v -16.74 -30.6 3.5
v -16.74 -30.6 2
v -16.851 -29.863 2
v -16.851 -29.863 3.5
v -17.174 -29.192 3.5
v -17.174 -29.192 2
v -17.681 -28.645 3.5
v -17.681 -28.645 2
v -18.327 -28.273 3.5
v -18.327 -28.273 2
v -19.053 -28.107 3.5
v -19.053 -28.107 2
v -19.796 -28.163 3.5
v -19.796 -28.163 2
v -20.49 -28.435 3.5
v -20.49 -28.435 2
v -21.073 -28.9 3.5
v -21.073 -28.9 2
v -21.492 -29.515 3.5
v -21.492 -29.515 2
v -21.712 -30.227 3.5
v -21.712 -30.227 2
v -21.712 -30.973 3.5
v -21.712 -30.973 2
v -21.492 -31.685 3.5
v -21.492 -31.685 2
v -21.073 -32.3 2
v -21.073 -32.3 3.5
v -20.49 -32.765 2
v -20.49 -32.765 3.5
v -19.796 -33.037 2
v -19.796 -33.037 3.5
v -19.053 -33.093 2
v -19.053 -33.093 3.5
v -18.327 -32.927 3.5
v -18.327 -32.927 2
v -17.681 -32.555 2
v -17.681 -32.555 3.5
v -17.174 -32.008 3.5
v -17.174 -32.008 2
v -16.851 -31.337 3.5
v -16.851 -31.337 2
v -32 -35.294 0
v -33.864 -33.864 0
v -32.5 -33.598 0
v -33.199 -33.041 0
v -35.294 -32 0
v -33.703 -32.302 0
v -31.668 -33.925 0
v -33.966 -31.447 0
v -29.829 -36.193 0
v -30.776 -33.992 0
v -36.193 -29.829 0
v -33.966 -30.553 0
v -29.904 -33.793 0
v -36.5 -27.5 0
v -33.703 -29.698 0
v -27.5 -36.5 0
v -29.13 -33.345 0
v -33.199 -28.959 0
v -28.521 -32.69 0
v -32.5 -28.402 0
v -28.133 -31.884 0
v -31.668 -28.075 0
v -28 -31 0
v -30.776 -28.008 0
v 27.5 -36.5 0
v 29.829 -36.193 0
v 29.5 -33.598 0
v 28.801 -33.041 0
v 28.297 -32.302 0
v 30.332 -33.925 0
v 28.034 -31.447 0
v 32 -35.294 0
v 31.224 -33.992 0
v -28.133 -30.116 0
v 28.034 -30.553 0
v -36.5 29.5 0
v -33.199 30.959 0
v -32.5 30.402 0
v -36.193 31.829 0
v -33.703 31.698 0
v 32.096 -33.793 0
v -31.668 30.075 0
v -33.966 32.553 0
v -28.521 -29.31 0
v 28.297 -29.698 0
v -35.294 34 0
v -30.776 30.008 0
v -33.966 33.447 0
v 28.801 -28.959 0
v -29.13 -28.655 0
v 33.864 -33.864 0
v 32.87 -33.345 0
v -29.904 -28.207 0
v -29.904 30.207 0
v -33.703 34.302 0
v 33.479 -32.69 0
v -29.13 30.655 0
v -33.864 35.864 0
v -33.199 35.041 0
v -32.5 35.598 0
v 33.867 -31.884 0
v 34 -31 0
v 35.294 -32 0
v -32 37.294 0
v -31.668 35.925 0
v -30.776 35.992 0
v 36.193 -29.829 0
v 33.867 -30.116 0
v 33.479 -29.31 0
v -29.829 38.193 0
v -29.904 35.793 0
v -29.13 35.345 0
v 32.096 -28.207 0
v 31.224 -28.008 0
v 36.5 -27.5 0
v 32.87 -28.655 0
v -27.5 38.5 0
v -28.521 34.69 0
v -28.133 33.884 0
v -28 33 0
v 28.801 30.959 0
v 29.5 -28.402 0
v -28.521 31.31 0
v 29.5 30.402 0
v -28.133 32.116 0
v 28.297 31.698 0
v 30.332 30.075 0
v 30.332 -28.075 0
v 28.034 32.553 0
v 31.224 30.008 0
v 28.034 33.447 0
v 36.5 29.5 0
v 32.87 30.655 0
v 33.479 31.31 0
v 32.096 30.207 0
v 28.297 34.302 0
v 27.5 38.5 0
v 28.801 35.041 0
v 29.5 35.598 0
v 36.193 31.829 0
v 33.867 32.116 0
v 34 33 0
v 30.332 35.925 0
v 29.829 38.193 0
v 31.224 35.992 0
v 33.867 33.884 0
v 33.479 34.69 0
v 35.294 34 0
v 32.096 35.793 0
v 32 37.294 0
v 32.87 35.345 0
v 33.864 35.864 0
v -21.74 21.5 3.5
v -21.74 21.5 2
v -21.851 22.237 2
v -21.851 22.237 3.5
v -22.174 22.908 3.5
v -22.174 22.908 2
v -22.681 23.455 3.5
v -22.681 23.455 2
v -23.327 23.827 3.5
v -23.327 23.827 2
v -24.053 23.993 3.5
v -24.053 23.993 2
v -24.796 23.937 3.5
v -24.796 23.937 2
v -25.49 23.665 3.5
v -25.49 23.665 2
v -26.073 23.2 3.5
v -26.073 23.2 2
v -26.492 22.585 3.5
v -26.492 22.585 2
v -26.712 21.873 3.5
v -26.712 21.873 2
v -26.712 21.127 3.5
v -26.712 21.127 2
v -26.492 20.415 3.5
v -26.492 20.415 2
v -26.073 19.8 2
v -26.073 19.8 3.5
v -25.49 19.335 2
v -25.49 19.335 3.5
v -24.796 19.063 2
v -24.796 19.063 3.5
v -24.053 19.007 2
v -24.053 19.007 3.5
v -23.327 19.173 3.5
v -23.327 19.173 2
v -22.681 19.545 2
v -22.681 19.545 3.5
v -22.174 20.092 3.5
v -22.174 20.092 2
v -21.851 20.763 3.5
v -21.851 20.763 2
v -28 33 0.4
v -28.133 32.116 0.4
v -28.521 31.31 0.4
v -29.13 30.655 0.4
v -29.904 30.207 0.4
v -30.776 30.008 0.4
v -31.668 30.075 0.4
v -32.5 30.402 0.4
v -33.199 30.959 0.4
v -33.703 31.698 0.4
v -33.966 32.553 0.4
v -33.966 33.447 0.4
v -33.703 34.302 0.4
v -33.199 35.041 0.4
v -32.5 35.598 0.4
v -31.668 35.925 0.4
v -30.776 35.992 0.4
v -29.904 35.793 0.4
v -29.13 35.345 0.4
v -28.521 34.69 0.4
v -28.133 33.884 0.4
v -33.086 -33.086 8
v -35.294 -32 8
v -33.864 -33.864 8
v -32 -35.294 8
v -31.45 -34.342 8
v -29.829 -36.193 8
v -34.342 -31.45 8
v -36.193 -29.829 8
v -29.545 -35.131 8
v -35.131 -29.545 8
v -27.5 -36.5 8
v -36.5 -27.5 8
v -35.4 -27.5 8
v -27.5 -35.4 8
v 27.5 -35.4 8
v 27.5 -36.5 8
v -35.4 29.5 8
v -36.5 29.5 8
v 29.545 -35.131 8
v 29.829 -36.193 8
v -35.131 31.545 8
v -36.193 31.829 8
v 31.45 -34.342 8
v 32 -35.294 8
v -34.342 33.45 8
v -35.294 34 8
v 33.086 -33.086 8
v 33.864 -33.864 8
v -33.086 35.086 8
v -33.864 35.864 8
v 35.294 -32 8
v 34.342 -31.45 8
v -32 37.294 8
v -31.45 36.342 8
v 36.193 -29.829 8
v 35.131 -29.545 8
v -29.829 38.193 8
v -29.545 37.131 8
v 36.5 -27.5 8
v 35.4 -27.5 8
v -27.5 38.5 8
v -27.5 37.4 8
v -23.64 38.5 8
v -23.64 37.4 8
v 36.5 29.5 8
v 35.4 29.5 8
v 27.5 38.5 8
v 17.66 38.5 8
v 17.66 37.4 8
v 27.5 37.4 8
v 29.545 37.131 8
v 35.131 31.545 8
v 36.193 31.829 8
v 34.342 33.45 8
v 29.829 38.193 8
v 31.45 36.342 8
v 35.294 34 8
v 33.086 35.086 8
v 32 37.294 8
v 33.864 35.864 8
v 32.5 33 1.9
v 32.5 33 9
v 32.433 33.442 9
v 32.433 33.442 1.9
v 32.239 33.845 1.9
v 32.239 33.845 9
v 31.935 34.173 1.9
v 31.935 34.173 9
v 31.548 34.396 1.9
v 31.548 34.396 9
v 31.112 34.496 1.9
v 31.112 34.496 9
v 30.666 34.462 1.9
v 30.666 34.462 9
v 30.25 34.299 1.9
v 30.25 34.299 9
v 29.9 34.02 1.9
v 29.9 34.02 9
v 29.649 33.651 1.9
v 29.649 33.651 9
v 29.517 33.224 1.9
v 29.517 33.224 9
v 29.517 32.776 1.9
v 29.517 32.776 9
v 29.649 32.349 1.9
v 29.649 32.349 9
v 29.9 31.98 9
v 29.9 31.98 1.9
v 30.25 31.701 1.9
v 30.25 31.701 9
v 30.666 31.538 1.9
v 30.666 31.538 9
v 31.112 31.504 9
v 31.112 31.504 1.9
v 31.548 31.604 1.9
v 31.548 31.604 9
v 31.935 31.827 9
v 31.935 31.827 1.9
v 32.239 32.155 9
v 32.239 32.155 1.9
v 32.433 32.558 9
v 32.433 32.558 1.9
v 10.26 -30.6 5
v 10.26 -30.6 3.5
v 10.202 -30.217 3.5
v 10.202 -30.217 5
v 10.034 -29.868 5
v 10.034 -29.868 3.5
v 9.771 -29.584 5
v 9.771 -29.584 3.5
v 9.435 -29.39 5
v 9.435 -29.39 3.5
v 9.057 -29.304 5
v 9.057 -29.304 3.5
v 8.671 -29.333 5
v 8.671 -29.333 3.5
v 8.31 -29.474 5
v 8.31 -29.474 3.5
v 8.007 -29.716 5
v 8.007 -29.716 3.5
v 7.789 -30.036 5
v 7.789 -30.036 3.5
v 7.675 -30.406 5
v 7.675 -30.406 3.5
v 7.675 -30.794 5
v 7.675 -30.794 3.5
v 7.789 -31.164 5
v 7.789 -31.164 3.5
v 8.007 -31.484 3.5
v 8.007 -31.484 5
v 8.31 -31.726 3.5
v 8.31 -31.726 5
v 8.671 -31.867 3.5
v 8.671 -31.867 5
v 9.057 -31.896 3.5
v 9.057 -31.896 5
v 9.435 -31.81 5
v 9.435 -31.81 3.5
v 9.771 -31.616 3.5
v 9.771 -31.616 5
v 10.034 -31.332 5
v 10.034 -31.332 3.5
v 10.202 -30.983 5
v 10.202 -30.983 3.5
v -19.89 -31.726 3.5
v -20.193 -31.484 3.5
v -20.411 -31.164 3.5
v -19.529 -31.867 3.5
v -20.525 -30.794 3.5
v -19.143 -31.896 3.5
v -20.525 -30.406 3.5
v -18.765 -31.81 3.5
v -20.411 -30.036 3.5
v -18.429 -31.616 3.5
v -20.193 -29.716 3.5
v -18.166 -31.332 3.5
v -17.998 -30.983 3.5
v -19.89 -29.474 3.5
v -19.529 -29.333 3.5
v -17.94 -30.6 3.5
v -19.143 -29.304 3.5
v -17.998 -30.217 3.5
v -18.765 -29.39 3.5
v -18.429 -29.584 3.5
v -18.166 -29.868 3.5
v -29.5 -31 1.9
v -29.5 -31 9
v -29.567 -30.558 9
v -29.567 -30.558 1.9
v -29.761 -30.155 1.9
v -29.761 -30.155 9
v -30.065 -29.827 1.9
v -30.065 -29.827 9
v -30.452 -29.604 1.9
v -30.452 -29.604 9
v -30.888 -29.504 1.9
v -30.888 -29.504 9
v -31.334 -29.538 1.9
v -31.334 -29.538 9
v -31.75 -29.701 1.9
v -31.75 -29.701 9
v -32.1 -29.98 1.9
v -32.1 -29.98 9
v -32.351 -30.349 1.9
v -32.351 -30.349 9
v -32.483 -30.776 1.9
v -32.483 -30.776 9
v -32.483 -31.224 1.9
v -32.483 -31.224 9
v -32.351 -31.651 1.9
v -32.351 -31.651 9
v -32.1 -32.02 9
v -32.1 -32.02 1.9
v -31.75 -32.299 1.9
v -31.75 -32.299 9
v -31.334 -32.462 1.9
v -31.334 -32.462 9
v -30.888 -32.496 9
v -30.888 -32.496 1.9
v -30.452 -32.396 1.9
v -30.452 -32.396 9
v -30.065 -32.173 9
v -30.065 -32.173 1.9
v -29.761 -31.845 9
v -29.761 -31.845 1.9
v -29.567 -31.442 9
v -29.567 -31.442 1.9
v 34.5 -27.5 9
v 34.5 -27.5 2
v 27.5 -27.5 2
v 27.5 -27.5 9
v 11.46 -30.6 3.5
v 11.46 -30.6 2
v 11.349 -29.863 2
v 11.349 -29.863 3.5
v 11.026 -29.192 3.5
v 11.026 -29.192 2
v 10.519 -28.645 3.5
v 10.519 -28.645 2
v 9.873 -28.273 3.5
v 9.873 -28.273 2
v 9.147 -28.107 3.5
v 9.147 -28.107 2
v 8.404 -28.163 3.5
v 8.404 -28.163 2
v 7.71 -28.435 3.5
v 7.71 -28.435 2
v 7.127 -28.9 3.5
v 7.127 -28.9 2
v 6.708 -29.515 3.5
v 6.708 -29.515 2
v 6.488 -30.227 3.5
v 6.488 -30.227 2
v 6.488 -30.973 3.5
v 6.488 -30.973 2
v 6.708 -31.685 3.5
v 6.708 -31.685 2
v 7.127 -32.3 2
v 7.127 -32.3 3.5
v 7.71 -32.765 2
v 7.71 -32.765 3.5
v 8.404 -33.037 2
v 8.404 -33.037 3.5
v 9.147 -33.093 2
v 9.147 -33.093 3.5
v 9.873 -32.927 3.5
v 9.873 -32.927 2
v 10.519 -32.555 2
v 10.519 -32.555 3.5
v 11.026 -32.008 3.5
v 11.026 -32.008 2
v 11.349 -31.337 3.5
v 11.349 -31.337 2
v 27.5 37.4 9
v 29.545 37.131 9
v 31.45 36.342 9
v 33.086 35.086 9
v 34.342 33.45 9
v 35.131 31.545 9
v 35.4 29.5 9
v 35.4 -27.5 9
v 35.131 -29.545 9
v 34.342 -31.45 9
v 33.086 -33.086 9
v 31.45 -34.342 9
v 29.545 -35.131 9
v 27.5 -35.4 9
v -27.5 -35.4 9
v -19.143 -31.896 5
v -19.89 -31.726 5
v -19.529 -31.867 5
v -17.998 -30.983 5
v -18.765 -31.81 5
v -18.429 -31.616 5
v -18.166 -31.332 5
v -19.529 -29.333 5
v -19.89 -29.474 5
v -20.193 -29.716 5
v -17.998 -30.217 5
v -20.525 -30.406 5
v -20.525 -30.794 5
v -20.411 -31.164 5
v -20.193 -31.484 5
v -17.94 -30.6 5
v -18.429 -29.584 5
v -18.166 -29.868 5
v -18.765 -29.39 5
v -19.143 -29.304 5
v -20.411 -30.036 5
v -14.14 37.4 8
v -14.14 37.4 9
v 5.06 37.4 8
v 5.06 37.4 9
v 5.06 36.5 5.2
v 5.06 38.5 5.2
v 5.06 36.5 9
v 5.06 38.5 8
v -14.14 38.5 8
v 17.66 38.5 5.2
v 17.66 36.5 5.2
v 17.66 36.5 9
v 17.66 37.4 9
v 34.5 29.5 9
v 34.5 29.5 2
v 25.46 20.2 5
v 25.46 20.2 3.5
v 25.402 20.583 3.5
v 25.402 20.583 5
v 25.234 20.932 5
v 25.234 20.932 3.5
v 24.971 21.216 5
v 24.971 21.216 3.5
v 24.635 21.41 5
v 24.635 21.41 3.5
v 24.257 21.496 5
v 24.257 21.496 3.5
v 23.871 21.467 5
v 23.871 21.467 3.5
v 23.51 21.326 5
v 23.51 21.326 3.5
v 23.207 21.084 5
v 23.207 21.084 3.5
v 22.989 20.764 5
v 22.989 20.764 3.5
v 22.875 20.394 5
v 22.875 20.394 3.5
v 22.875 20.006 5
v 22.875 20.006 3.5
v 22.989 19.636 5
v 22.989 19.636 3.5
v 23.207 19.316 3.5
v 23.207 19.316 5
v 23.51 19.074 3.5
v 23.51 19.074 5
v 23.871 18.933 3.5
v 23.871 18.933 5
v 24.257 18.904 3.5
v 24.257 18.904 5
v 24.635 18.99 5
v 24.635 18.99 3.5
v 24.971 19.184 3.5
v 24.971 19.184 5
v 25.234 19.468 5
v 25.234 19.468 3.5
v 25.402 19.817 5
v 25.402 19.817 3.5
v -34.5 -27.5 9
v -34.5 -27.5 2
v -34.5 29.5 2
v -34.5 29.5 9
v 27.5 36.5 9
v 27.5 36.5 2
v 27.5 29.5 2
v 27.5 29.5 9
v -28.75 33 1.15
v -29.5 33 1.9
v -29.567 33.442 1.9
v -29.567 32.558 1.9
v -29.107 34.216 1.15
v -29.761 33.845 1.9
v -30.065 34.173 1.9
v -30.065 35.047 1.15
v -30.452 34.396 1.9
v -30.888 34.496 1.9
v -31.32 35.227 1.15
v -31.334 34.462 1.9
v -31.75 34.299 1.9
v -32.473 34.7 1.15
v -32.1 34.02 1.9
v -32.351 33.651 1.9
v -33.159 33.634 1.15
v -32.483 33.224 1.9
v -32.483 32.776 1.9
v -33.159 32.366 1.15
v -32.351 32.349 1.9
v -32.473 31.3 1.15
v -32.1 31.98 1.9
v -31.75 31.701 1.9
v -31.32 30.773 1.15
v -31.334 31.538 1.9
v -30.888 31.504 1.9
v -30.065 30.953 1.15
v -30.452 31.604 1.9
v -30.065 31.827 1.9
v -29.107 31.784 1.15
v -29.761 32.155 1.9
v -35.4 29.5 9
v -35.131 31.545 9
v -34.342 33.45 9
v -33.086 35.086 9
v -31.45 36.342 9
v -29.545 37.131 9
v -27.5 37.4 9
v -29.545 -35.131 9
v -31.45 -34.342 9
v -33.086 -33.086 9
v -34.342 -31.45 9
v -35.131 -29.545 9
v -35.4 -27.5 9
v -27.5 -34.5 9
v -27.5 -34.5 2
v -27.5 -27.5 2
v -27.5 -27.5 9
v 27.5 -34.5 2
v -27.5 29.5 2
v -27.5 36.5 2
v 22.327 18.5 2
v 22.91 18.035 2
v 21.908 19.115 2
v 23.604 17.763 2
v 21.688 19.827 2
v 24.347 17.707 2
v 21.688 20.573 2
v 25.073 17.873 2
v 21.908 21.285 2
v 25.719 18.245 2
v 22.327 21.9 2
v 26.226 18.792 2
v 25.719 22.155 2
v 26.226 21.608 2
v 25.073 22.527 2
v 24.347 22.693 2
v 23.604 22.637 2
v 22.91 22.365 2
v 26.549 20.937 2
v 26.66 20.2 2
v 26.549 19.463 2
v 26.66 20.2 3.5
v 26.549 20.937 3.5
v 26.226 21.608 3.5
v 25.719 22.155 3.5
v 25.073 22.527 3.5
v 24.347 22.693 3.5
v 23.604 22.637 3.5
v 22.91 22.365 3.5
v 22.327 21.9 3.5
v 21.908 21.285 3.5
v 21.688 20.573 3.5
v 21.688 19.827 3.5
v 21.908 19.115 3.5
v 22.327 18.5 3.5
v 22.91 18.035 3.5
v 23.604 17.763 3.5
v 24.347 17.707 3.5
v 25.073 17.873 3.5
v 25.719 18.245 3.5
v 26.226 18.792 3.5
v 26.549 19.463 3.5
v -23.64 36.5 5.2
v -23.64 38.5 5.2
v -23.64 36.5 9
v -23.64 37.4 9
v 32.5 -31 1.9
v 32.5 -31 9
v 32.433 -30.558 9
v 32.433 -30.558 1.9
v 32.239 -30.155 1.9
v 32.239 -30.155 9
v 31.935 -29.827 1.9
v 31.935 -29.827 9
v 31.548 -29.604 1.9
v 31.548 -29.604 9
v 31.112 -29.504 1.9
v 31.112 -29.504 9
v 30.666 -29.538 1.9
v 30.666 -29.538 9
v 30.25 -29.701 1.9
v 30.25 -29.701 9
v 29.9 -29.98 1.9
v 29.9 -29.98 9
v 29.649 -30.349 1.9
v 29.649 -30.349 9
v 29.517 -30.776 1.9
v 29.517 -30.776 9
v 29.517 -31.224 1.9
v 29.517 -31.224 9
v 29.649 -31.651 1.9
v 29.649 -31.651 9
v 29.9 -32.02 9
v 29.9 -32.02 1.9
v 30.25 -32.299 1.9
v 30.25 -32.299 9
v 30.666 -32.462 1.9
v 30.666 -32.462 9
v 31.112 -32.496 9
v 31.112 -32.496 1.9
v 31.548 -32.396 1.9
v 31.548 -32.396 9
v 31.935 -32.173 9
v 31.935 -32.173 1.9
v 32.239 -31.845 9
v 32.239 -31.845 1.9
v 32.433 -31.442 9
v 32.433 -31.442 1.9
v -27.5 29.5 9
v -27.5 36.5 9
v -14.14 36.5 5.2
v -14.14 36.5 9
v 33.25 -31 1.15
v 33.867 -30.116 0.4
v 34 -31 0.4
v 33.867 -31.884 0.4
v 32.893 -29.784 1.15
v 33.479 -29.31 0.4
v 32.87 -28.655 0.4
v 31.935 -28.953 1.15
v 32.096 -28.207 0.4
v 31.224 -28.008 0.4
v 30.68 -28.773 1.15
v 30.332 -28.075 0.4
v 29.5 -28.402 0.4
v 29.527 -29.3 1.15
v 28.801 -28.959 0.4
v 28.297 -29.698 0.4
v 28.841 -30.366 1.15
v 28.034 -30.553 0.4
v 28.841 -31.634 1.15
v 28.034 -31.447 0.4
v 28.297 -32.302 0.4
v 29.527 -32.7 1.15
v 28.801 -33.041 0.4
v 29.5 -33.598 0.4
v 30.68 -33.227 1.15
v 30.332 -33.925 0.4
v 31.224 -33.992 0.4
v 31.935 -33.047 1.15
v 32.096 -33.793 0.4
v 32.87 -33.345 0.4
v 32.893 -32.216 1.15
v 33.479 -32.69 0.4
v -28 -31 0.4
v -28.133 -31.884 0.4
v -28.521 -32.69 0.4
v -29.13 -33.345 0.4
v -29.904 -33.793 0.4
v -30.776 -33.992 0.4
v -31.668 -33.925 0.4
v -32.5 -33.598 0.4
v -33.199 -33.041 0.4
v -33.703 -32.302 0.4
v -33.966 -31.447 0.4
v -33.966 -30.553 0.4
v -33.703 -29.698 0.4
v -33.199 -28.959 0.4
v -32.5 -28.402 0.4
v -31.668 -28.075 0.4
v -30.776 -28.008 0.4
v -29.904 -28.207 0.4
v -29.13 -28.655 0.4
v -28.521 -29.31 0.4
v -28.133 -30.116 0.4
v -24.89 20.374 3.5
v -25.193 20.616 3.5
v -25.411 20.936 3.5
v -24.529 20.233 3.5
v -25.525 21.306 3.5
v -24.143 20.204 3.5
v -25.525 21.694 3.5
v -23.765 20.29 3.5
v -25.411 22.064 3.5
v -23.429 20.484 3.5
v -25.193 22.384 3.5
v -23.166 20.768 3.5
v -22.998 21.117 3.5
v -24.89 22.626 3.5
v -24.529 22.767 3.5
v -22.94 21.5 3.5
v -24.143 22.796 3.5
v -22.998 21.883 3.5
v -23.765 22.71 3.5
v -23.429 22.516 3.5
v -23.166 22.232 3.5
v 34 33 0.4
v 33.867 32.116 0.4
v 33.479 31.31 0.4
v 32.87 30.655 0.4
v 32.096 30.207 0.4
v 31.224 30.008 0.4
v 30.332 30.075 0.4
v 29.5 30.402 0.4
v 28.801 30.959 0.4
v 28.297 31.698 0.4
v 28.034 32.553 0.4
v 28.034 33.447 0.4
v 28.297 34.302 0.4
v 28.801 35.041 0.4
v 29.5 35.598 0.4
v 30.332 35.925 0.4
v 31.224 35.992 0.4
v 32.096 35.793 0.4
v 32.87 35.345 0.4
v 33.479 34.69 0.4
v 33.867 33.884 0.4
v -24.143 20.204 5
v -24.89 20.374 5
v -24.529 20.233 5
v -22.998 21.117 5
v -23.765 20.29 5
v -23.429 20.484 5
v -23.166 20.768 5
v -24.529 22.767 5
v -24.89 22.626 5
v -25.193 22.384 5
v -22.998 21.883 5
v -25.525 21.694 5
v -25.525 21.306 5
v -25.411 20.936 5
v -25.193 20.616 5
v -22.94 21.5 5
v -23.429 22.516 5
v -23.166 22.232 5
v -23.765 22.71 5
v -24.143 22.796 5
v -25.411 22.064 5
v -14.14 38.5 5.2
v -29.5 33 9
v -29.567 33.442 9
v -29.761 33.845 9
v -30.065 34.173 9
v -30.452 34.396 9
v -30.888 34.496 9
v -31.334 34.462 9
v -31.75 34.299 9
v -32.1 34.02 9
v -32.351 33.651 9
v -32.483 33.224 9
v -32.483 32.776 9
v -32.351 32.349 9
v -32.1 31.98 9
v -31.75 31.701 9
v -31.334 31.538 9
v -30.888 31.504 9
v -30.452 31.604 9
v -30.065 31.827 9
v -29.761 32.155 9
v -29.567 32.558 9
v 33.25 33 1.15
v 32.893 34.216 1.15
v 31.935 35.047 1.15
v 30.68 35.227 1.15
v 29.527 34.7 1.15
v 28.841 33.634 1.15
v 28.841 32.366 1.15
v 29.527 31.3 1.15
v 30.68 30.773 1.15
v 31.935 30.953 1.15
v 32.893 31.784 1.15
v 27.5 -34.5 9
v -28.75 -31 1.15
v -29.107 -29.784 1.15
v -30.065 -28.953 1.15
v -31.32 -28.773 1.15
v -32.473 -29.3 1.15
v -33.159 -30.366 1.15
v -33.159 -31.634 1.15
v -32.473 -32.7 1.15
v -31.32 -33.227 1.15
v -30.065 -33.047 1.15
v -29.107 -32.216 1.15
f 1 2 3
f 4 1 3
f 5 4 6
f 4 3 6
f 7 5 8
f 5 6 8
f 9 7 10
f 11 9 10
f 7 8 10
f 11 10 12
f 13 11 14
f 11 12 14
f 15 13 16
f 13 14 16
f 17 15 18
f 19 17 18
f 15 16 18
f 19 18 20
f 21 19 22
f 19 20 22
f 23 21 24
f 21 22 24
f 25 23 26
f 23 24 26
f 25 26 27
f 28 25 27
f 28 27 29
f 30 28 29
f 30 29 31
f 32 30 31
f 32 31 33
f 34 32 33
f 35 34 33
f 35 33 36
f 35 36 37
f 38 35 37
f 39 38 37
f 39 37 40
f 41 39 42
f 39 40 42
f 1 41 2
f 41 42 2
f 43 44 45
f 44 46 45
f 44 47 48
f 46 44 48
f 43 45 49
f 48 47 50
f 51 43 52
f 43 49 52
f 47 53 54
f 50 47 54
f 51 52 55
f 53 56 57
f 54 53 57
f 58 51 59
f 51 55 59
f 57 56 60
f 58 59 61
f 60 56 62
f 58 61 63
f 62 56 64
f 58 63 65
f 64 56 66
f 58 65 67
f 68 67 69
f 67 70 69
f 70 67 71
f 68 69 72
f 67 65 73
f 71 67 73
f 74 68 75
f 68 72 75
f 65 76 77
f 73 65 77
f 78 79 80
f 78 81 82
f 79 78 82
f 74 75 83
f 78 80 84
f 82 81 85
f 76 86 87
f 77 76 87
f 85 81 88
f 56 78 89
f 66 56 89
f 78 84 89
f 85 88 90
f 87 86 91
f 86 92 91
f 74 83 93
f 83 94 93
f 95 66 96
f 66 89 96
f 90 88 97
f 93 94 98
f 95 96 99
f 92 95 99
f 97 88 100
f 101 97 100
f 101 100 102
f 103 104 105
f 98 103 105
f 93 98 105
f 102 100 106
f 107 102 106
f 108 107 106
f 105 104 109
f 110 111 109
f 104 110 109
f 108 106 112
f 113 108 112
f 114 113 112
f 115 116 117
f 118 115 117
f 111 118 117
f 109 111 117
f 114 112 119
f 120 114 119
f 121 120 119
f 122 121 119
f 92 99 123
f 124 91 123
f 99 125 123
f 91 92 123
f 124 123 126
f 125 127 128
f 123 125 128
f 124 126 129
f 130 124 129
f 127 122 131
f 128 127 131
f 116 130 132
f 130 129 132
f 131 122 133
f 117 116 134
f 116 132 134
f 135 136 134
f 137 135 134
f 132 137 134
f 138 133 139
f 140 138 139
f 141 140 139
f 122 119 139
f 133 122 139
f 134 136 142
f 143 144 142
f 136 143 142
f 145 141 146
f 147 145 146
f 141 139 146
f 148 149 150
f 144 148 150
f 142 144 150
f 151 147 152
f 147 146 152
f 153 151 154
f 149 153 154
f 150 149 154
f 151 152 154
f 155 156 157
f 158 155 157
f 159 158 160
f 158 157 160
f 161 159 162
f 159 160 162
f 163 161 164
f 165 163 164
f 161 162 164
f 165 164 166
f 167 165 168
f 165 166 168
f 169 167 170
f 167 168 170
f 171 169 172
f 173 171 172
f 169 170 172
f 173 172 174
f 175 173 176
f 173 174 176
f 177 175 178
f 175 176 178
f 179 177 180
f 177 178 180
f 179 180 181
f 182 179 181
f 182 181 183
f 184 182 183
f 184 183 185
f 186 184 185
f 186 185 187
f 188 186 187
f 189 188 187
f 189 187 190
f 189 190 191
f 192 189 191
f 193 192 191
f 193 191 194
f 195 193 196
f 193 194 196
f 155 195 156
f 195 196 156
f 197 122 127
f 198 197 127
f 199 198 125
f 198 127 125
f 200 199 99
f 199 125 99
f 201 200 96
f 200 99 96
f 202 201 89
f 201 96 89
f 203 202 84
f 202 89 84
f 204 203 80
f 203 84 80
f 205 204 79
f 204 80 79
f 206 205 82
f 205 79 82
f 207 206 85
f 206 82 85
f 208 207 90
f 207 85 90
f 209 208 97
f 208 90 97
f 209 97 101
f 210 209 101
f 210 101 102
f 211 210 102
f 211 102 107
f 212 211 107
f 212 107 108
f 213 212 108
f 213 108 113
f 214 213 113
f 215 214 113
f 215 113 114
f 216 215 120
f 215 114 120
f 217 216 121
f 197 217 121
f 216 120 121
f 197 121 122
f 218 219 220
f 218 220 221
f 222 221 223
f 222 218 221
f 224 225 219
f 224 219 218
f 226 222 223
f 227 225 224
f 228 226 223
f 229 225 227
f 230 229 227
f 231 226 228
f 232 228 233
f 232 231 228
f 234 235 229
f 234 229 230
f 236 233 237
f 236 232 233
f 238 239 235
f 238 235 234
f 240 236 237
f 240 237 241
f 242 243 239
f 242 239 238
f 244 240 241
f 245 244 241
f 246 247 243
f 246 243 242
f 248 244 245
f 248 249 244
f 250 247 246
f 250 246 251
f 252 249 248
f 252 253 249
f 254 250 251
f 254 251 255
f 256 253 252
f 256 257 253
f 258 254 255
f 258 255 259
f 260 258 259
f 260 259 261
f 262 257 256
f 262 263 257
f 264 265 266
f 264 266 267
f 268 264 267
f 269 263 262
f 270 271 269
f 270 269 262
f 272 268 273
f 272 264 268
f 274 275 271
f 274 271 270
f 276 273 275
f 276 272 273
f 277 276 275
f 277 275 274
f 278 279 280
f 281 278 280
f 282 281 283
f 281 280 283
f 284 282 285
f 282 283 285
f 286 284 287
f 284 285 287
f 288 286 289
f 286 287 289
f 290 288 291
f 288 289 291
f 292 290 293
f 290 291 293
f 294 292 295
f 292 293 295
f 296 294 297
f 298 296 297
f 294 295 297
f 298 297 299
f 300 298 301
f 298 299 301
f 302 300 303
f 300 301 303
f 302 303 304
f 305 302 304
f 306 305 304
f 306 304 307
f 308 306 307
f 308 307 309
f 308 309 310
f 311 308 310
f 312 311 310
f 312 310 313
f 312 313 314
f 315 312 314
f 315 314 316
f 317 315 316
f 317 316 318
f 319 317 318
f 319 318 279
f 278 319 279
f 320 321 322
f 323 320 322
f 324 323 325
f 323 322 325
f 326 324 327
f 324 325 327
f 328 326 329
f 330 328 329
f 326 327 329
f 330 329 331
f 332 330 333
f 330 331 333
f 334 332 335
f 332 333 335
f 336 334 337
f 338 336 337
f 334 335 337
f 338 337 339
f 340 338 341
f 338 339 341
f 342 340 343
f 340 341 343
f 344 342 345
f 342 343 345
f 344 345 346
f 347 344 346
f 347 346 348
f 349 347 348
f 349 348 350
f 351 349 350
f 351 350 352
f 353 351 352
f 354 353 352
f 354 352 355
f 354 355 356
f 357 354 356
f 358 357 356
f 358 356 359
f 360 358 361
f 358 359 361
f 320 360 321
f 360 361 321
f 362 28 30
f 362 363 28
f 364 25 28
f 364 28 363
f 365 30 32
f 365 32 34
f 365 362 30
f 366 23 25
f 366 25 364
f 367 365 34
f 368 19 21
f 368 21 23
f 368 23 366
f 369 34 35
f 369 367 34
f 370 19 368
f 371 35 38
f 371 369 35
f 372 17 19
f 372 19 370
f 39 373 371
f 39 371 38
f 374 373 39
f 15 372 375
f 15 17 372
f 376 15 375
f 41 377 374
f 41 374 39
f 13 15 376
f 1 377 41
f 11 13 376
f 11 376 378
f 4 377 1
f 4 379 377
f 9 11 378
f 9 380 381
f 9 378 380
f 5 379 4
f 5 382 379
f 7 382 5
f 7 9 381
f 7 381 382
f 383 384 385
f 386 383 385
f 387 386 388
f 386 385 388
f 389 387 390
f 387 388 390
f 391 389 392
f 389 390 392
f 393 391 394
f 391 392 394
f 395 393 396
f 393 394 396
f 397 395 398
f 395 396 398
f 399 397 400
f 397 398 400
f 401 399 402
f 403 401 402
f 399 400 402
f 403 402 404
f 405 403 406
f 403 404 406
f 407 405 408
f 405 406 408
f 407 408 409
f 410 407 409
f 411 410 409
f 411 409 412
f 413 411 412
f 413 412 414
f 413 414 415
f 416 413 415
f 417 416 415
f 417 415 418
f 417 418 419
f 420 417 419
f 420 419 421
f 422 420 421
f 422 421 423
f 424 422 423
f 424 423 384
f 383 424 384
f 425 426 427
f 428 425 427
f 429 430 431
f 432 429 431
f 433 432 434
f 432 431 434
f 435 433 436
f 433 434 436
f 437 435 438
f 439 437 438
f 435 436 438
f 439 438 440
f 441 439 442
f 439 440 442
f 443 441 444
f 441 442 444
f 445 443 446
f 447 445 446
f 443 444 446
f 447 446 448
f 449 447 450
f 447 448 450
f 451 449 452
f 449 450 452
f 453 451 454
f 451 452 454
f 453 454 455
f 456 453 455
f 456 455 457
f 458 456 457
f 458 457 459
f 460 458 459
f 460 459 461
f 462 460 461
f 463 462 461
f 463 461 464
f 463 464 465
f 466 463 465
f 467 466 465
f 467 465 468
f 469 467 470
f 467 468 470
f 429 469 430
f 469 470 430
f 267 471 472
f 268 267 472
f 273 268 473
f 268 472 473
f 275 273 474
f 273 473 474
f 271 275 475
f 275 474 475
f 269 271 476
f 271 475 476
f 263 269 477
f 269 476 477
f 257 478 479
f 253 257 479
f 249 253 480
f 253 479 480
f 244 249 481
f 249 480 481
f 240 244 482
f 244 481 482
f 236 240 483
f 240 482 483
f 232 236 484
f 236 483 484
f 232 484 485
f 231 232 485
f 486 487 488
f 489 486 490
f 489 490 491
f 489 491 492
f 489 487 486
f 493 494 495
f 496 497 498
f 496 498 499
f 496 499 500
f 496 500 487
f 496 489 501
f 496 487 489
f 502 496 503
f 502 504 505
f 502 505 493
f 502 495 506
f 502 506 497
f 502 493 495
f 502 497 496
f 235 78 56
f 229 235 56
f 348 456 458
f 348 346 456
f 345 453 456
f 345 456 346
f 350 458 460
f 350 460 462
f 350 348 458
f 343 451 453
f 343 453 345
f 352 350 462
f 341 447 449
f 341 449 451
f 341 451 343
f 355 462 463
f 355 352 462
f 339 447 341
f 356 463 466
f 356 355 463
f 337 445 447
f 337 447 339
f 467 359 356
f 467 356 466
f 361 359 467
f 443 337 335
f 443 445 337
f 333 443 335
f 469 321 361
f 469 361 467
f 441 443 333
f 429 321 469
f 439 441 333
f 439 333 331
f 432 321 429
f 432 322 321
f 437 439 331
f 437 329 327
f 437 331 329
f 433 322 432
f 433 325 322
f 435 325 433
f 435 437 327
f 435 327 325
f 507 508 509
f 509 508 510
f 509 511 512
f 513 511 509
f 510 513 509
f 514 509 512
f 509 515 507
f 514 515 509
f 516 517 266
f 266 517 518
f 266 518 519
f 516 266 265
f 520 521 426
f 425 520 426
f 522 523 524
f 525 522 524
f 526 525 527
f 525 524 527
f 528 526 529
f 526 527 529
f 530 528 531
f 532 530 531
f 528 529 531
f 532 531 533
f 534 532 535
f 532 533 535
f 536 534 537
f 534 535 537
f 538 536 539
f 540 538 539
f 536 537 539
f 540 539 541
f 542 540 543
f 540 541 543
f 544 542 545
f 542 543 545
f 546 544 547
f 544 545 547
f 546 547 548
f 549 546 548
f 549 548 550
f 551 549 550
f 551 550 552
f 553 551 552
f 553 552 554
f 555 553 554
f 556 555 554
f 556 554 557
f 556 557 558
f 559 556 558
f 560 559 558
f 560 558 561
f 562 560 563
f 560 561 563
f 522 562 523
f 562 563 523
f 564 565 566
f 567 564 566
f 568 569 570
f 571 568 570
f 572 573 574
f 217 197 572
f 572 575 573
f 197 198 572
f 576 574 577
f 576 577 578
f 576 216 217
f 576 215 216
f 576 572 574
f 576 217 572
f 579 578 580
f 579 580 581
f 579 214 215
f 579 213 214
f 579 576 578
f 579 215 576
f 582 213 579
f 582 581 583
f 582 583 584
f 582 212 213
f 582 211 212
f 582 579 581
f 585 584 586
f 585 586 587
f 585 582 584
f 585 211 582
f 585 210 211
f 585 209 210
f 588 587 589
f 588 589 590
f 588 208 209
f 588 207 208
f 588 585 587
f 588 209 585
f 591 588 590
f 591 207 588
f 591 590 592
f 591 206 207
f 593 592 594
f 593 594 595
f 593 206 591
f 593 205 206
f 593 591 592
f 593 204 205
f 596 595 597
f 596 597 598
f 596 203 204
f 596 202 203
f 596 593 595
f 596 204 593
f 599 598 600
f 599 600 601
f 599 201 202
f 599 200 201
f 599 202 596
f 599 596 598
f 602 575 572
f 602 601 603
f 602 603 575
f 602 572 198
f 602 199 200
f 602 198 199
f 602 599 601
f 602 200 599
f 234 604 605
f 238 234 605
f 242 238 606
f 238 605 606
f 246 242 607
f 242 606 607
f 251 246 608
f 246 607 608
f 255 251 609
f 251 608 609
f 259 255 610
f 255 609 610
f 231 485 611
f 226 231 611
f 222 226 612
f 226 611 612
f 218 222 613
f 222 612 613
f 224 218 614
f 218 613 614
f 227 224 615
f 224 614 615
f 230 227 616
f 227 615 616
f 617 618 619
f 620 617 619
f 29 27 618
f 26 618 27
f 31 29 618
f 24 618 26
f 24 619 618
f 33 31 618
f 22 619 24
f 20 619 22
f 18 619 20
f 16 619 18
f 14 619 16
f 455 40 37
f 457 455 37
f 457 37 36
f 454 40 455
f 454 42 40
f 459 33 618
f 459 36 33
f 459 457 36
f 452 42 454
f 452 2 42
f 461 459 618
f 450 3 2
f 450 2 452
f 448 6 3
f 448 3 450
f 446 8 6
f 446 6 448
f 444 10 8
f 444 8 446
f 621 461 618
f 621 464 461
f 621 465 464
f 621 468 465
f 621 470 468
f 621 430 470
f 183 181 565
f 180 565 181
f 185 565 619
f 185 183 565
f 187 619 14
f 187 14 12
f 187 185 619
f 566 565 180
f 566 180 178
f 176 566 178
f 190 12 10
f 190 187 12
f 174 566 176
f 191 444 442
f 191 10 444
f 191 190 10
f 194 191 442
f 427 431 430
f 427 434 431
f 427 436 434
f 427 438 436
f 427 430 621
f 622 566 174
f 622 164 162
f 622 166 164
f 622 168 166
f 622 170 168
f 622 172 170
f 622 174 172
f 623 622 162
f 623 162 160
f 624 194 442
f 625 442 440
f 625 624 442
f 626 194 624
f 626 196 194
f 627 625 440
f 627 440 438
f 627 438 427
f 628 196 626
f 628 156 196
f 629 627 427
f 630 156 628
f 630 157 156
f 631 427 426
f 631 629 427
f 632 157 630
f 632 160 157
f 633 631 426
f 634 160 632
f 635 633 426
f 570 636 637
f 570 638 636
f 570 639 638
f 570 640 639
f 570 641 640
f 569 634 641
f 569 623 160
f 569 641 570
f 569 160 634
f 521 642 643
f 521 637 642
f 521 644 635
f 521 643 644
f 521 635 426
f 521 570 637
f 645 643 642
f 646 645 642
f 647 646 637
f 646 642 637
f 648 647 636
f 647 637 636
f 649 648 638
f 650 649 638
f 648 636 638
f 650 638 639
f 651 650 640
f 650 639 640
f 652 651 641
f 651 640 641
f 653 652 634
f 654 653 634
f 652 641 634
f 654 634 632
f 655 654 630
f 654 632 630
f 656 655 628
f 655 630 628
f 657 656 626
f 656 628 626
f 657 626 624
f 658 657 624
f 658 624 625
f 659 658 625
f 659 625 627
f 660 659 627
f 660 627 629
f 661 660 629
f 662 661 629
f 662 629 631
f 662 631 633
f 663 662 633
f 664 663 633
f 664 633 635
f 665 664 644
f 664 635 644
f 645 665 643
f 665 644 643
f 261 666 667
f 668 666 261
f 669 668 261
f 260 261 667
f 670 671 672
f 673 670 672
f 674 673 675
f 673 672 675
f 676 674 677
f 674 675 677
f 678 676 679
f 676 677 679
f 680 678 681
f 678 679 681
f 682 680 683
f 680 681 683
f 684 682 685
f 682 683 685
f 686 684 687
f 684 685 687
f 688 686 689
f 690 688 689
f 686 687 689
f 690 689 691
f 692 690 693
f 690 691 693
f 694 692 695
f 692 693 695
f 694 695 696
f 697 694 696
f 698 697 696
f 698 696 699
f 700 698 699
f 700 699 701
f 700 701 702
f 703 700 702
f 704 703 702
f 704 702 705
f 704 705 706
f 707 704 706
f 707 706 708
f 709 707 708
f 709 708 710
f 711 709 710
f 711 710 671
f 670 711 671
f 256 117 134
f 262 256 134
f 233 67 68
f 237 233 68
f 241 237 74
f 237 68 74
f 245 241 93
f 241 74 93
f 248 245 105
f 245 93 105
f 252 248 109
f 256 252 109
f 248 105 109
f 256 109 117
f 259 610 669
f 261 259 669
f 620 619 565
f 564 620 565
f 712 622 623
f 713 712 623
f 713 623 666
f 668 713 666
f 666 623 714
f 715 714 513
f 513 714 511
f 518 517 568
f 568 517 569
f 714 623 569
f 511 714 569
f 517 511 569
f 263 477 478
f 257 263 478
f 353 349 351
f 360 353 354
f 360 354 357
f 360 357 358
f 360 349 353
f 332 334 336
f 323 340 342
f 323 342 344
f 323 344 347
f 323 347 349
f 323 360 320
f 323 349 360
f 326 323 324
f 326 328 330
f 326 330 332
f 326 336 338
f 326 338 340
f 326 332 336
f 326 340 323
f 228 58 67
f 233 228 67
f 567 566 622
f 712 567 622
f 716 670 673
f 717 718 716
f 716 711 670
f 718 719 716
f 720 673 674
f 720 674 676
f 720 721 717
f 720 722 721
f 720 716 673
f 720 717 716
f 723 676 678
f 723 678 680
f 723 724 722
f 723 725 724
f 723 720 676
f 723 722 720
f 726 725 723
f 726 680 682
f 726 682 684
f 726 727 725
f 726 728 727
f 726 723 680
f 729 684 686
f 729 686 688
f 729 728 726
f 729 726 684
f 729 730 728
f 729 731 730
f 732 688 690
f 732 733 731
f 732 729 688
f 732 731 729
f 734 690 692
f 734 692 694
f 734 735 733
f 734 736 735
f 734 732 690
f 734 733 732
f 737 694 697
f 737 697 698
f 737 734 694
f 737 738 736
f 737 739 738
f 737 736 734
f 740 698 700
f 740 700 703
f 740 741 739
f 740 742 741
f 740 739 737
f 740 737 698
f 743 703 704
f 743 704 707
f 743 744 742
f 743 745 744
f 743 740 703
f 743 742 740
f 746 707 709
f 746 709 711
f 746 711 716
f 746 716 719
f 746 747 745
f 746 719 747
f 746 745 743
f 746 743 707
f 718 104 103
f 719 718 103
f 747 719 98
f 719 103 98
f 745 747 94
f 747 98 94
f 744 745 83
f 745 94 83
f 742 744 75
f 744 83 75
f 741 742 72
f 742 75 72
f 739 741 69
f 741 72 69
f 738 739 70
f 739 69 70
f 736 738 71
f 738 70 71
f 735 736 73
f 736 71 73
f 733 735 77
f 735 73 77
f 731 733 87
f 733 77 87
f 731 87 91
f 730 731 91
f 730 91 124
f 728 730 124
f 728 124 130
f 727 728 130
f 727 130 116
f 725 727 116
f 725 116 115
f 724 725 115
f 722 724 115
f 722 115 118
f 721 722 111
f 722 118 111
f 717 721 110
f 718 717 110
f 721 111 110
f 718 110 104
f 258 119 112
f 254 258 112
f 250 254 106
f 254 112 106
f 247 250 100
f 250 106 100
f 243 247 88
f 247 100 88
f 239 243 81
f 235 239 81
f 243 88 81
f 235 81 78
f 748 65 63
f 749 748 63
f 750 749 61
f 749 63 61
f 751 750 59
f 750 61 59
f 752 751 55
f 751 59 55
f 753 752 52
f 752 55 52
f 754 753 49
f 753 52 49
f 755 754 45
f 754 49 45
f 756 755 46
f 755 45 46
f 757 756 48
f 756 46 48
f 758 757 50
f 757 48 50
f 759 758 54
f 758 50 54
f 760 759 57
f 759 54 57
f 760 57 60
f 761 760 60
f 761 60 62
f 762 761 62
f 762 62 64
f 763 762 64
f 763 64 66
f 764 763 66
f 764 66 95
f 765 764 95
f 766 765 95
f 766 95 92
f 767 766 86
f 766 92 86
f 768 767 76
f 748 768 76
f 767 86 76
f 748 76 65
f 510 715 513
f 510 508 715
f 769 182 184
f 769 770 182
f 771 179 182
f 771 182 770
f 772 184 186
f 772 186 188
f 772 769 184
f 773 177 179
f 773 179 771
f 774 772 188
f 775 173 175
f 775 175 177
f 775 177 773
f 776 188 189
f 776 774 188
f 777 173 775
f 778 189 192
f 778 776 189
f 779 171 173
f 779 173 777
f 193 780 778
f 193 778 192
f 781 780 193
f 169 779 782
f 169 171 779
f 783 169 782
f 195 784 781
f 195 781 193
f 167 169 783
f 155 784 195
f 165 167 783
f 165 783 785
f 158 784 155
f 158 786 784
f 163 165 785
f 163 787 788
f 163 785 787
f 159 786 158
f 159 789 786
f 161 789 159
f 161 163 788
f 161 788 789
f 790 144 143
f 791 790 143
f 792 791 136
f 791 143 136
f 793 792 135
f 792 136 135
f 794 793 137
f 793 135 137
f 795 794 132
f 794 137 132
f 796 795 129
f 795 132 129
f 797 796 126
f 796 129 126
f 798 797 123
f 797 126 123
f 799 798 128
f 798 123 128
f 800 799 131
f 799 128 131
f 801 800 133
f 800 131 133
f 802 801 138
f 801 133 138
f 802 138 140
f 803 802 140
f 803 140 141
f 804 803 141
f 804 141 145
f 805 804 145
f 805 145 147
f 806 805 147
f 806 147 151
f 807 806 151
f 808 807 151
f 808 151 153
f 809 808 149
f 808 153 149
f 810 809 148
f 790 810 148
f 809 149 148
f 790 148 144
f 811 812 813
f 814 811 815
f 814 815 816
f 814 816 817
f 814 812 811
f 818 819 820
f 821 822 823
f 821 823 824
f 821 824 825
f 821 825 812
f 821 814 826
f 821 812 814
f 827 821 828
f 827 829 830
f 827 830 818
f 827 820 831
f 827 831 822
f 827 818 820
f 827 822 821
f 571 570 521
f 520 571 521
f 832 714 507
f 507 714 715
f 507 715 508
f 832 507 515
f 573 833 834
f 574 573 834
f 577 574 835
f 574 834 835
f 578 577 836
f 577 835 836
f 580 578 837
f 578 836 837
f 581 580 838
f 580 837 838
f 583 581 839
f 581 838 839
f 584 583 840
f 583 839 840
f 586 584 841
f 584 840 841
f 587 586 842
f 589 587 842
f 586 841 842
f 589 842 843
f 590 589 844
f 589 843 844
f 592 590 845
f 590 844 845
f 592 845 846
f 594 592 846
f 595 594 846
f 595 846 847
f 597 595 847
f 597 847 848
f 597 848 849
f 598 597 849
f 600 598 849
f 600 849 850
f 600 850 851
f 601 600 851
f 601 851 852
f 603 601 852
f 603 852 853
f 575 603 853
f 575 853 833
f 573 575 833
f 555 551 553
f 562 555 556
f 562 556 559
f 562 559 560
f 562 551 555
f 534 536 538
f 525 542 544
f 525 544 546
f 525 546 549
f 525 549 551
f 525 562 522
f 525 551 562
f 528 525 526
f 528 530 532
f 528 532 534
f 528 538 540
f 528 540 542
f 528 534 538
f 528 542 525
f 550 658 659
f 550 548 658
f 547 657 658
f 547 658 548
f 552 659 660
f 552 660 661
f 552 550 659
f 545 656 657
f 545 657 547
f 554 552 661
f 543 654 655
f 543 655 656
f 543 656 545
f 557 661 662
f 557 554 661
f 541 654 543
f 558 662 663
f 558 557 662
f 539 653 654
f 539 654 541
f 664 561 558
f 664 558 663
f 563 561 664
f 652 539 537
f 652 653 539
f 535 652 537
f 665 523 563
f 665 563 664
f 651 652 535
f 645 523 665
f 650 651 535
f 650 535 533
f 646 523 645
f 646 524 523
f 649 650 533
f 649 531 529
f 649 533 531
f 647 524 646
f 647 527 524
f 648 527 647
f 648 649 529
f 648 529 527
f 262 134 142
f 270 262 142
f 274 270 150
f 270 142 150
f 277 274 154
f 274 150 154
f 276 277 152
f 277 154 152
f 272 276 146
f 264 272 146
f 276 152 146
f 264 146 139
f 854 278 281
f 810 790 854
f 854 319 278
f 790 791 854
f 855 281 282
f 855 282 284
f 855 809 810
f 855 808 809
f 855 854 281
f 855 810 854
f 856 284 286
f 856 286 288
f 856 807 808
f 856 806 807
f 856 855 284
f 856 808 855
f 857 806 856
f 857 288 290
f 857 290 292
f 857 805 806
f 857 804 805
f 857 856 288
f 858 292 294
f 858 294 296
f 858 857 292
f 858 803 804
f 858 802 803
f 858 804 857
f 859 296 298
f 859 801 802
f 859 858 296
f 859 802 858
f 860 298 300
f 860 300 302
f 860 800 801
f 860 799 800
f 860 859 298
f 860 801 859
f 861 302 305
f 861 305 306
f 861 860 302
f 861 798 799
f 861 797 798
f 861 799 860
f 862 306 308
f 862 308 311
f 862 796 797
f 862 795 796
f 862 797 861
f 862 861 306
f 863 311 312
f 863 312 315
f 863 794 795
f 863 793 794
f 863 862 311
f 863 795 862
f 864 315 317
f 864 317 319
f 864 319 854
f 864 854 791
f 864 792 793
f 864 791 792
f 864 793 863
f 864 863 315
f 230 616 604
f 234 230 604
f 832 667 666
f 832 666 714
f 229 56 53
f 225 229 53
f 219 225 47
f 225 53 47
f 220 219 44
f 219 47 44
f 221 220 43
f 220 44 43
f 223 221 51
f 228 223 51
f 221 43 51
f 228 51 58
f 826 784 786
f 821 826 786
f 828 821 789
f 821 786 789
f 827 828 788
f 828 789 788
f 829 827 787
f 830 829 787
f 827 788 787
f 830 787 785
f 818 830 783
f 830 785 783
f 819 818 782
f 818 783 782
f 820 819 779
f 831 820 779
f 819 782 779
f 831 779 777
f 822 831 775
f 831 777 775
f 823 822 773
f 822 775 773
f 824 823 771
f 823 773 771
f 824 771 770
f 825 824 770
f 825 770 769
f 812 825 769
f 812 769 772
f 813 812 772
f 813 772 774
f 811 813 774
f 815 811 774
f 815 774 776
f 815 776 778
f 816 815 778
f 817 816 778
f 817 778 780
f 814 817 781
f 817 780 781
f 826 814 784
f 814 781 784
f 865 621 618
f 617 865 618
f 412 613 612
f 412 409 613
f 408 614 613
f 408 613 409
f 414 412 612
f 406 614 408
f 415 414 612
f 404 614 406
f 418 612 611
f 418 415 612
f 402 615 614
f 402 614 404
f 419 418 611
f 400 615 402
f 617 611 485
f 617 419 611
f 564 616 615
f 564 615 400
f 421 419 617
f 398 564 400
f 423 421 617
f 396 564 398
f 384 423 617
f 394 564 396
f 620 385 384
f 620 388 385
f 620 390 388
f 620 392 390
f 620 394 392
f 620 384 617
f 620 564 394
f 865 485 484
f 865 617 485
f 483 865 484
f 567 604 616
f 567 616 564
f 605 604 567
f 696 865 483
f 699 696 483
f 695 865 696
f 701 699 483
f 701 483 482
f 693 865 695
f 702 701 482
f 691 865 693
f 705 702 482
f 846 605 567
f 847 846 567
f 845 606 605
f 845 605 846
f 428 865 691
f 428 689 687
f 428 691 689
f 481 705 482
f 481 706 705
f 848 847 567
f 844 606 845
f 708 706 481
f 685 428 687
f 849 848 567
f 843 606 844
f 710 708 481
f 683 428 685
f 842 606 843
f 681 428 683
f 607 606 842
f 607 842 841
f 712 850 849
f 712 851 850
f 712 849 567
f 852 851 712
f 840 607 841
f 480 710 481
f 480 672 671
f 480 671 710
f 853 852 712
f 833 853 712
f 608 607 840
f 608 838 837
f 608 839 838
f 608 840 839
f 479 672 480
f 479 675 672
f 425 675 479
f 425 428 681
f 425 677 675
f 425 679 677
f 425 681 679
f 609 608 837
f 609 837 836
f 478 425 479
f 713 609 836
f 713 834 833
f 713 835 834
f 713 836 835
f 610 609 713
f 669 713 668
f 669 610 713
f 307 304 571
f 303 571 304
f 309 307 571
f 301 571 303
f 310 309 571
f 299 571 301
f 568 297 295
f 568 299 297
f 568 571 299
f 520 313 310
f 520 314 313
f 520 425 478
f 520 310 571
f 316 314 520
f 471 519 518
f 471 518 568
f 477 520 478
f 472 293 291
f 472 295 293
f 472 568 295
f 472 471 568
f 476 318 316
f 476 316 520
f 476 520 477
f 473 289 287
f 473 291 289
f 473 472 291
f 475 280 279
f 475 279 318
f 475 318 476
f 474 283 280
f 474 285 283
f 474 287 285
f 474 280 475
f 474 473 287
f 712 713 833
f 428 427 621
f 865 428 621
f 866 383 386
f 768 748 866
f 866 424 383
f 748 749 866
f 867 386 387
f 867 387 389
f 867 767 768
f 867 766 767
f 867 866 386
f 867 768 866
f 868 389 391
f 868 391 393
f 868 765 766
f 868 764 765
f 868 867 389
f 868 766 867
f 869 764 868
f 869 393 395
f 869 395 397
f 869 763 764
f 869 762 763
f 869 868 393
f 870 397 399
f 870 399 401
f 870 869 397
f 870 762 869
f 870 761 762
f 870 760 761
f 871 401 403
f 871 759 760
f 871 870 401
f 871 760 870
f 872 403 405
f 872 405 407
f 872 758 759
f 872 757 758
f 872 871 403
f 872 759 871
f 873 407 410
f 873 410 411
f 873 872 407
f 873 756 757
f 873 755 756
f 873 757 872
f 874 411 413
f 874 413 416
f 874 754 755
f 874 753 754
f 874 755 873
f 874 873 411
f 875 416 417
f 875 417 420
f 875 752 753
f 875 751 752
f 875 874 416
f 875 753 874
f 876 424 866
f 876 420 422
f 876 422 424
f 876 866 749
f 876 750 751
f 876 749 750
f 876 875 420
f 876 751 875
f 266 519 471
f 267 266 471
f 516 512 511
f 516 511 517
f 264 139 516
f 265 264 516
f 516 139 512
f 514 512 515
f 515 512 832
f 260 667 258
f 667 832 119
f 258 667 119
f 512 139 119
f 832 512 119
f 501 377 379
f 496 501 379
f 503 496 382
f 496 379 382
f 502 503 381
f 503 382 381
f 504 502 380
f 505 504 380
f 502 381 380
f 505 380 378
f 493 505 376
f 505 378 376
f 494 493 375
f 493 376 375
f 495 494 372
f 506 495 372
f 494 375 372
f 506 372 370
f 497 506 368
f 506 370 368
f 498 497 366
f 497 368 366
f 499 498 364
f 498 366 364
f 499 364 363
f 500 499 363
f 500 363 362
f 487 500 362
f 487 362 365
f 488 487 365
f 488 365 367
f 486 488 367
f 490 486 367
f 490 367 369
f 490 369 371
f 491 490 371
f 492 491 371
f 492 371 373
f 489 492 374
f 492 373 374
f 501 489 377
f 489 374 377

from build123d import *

# Parameters (mm, degrees)
F1_DEPTH  = 2
F2_R      = 2.5
F3_DEPTH  = 1.5
F4_R      = 1.3
F5_DEPTH  = 1.5
F7_DEPTH  = 7
F8_R      = 1.5
F9_DEPTH  = 10
F10_W     = 12.6
F10_H     = 2
F10_W_2   = 9.5
F11_DEPTH = 3.8
F12_R     = 3
F13_DEPTH = 0.4
F14_SIZE  = 1.49999
F15_W     = 19.2
F15_H     = 1.1
F16_DEPTH = 1


# Not quite as in the source:
# - a fillet or chamfer is up to 0.001 mm smaller than in the source, because OpenCascade refuses the exact size


with BuildPart() as f1:
    # F0 (on Top) → F1 (new body)
    with BuildSketch(Plane.XY):
        with BuildLine():
            Line((27.5, 38.5), (-27.5, 38.5))
            ThreePointArc((-27.5, 38.5), (-33.8639610307, 35.8639610307), (-36.5, 29.5))
            Line((-36.5, 29.5), (-36.5, -27.5))
            ThreePointArc((-36.5, -27.5), (-33.8639610307, -33.8639610307), (-27.5, -36.5))
            Line((-27.5, -36.5), (27.5, -36.5))
            ThreePointArc((27.5, -36.5), (33.8639610307, -33.8639610307), (36.5, -27.5))
            Line((36.5, -27.5), (36.5, 29.5))
            ThreePointArc((36.5, 29.5), (33.8639610307, 35.8639610307), (27.5, 38.5))
        make_face()
    extrude(amount=F1_DEPTH)

    # F2 (on face) → F3 (join)
    with BuildSketch(Plane.XY.offset(2)):
        with Locations((-19.24, -30.6)):
            Circle(F2_R)
        with Locations((8.96, -30.6)):
            Circle(F2_R)
        with Locations((24.16, 20.2)):
            Circle(F2_R)
        with Locations((-24.24, 21.5)):
            Circle(F2_R)
    extrude(amount=F3_DEPTH)

    # F4 (on face) → F5 (join)
    with BuildSketch(Plane.XY.offset(3.5)):
        with Locations((-19.24, -30.6)):
            Circle(F4_R)
        with Locations((8.96, -30.6)):
            Circle(F4_R)
        with Locations((24.16, 20.2)):
            Circle(F4_R)
        with Locations((-24.24, 21.5)):
            Circle(F4_R)
    extrude(amount=F5_DEPTH)

    # F6 (on face) → F7 (join)
    with BuildSketch(Plane.XY.offset(2)):
        with BuildLine():
            Line((27.5, 38.5), (-27.5, 38.5))
            ThreePointArc((-27.5, 38.5), (-33.8639610307, 35.8639610307), (-36.5, 29.5))
            Line((-36.5, 29.5), (-36.5, -27.5))
            ThreePointArc((-36.5, -27.5), (-33.8639610307, -33.8639610307), (-27.5, -36.5))
            Line((-27.5, -36.5), (27.5, -36.5))
            ThreePointArc((27.5, -36.5), (33.8639610307, -33.8639610307), (36.5, -27.5))
            Line((36.5, -27.5), (36.5, 29.5))
            ThreePointArc((36.5, 29.5), (33.8639610307, 35.8639610307), (27.5, 38.5))
        make_face()
        Polygon((-27.5, 29.5), (-27.5, 36.5), (27.5, 36.5), (27.5, 29.5), (34.5, 29.5), (34.5, -27.5), (27.5, -27.5), (27.5, -34.5), (-27.5, -34.5), (-27.5, -27.5), (-34.5, -27.5), (-34.5, 29.5), align=None, mode=Mode.SUBTRACT)
    extrude(amount=F7_DEPTH)

    # F8 (on face) → F9 (cut)
    with BuildSketch(Plane.XY.offset(9)):
        with Locations((-31, 33)):
            Circle(F8_R)
        with Locations((31, 33)):
            Circle(F8_R)
        with Locations((-31, -31)):
            Circle(F8_R)
        with Locations((31, -31)):
            Circle(F8_R)
    extrude(amount=-F9_DEPTH, mode=Mode.SUBTRACT)

    # F10 (on face) → F11 (cut)
    with BuildSketch(Plane.XY.offset(9)):
        with Locations((11.36, 37.5)):
            Rectangle(F10_W, F10_H)
        with Locations((-18.89, 37.5)):
            Rectangle(F10_W_2, F10_H)
    extrude(amount=-F11_DEPTH, mode=Mode.SUBTRACT)

    # F12 (on face) → F13 (cut)
    with BuildSketch(Plane(origin=(0, 0, 0), x_dir=(1, 0, 0), z_dir=(0, 0, -1))):
        with Locations((31, -33)):
            Circle(F12_R)
        with Locations((-31, -33)):
            Circle(F12_R)
        with Locations((-31, 31)):
            Circle(F12_R)
        with Locations((31, 31)):
            Circle(F12_R)
    extrude(amount=-F13_DEPTH, mode=Mode.SUBTRACT)

    # F14 (size 1.5 in the source; OpenCascade refuses exactly that, so slightly less here)
    f14_edges = [f1.edges().sort_by_distance(p)[0] for p in [
        (29.5, 33, 0.4),
        (-32.5, 33, 0.4),
        (29.5, -31, 0.4),
        (-32.5, -31, 0.4),
    ]]
    chamfer(f14_edges, length=F14_SIZE)

    # F15 (on face) → F16 (cut)
    with BuildSketch(Plane.XY.offset(9)):
        with BuildLine():
            Line((-23.64, 38.5), (-27.5, 38.5))
            ThreePointArc((-27.5, 38.5), (-33.8639610307, 35.8639610307), (-36.5, 29.5))
            Line((-36.5, 29.5), (-36.5, -27.5))
            ThreePointArc((-36.5, -27.5), (-33.8639610307, -33.8639610307), (-27.5, -36.5))
            Line((-27.5, -36.5), (27.5, -36.5))
            ThreePointArc((27.5, -36.5), (33.8639610307, -33.8639610307), (36.5, -27.5))
            Line((36.5, -27.5), (36.5, 29.5))
            ThreePointArc((36.5, 29.5), (33.8639610307, 35.8639610307), (27.5, 38.5))
            Line((27.5, 38.5), (17.66, 38.5))
            Line((17.66, 38.5), (17.66, 37.4))
            Line((17.66, 37.4), (27.5, 37.4))
            ThreePointArc((27.5, 37.4), (33.0861435714, 35.0861435714), (35.4, 29.5))
            Line((35.4, 29.5), (35.4, -27.5))
            ThreePointArc((35.4, -27.5), (33.0861435714, -33.0861435714), (27.5, -35.4))
            Line((27.5, -35.4), (-27.5, -35.4))
            ThreePointArc((-27.5, -35.4), (-33.0861435714, -33.0861435714), (-35.4, -27.5))
            Line((-35.4, -27.5), (-35.4, 29.5))
            ThreePointArc((-35.4, 29.5), (-33.0861435714, 35.0861435714), (-27.5, 37.4))
            Line((-27.5, 37.4), (-23.64, 37.4))
            Line((-23.64, 37.4), (-23.64, 38.5))
        make_face()
        with Locations((-4.54, 37.95)):
            Rectangle(F15_W, F15_H)
    extrude(amount=-F16_DEPTH, mode=Mode.SUBTRACT)


solid = f1.part
